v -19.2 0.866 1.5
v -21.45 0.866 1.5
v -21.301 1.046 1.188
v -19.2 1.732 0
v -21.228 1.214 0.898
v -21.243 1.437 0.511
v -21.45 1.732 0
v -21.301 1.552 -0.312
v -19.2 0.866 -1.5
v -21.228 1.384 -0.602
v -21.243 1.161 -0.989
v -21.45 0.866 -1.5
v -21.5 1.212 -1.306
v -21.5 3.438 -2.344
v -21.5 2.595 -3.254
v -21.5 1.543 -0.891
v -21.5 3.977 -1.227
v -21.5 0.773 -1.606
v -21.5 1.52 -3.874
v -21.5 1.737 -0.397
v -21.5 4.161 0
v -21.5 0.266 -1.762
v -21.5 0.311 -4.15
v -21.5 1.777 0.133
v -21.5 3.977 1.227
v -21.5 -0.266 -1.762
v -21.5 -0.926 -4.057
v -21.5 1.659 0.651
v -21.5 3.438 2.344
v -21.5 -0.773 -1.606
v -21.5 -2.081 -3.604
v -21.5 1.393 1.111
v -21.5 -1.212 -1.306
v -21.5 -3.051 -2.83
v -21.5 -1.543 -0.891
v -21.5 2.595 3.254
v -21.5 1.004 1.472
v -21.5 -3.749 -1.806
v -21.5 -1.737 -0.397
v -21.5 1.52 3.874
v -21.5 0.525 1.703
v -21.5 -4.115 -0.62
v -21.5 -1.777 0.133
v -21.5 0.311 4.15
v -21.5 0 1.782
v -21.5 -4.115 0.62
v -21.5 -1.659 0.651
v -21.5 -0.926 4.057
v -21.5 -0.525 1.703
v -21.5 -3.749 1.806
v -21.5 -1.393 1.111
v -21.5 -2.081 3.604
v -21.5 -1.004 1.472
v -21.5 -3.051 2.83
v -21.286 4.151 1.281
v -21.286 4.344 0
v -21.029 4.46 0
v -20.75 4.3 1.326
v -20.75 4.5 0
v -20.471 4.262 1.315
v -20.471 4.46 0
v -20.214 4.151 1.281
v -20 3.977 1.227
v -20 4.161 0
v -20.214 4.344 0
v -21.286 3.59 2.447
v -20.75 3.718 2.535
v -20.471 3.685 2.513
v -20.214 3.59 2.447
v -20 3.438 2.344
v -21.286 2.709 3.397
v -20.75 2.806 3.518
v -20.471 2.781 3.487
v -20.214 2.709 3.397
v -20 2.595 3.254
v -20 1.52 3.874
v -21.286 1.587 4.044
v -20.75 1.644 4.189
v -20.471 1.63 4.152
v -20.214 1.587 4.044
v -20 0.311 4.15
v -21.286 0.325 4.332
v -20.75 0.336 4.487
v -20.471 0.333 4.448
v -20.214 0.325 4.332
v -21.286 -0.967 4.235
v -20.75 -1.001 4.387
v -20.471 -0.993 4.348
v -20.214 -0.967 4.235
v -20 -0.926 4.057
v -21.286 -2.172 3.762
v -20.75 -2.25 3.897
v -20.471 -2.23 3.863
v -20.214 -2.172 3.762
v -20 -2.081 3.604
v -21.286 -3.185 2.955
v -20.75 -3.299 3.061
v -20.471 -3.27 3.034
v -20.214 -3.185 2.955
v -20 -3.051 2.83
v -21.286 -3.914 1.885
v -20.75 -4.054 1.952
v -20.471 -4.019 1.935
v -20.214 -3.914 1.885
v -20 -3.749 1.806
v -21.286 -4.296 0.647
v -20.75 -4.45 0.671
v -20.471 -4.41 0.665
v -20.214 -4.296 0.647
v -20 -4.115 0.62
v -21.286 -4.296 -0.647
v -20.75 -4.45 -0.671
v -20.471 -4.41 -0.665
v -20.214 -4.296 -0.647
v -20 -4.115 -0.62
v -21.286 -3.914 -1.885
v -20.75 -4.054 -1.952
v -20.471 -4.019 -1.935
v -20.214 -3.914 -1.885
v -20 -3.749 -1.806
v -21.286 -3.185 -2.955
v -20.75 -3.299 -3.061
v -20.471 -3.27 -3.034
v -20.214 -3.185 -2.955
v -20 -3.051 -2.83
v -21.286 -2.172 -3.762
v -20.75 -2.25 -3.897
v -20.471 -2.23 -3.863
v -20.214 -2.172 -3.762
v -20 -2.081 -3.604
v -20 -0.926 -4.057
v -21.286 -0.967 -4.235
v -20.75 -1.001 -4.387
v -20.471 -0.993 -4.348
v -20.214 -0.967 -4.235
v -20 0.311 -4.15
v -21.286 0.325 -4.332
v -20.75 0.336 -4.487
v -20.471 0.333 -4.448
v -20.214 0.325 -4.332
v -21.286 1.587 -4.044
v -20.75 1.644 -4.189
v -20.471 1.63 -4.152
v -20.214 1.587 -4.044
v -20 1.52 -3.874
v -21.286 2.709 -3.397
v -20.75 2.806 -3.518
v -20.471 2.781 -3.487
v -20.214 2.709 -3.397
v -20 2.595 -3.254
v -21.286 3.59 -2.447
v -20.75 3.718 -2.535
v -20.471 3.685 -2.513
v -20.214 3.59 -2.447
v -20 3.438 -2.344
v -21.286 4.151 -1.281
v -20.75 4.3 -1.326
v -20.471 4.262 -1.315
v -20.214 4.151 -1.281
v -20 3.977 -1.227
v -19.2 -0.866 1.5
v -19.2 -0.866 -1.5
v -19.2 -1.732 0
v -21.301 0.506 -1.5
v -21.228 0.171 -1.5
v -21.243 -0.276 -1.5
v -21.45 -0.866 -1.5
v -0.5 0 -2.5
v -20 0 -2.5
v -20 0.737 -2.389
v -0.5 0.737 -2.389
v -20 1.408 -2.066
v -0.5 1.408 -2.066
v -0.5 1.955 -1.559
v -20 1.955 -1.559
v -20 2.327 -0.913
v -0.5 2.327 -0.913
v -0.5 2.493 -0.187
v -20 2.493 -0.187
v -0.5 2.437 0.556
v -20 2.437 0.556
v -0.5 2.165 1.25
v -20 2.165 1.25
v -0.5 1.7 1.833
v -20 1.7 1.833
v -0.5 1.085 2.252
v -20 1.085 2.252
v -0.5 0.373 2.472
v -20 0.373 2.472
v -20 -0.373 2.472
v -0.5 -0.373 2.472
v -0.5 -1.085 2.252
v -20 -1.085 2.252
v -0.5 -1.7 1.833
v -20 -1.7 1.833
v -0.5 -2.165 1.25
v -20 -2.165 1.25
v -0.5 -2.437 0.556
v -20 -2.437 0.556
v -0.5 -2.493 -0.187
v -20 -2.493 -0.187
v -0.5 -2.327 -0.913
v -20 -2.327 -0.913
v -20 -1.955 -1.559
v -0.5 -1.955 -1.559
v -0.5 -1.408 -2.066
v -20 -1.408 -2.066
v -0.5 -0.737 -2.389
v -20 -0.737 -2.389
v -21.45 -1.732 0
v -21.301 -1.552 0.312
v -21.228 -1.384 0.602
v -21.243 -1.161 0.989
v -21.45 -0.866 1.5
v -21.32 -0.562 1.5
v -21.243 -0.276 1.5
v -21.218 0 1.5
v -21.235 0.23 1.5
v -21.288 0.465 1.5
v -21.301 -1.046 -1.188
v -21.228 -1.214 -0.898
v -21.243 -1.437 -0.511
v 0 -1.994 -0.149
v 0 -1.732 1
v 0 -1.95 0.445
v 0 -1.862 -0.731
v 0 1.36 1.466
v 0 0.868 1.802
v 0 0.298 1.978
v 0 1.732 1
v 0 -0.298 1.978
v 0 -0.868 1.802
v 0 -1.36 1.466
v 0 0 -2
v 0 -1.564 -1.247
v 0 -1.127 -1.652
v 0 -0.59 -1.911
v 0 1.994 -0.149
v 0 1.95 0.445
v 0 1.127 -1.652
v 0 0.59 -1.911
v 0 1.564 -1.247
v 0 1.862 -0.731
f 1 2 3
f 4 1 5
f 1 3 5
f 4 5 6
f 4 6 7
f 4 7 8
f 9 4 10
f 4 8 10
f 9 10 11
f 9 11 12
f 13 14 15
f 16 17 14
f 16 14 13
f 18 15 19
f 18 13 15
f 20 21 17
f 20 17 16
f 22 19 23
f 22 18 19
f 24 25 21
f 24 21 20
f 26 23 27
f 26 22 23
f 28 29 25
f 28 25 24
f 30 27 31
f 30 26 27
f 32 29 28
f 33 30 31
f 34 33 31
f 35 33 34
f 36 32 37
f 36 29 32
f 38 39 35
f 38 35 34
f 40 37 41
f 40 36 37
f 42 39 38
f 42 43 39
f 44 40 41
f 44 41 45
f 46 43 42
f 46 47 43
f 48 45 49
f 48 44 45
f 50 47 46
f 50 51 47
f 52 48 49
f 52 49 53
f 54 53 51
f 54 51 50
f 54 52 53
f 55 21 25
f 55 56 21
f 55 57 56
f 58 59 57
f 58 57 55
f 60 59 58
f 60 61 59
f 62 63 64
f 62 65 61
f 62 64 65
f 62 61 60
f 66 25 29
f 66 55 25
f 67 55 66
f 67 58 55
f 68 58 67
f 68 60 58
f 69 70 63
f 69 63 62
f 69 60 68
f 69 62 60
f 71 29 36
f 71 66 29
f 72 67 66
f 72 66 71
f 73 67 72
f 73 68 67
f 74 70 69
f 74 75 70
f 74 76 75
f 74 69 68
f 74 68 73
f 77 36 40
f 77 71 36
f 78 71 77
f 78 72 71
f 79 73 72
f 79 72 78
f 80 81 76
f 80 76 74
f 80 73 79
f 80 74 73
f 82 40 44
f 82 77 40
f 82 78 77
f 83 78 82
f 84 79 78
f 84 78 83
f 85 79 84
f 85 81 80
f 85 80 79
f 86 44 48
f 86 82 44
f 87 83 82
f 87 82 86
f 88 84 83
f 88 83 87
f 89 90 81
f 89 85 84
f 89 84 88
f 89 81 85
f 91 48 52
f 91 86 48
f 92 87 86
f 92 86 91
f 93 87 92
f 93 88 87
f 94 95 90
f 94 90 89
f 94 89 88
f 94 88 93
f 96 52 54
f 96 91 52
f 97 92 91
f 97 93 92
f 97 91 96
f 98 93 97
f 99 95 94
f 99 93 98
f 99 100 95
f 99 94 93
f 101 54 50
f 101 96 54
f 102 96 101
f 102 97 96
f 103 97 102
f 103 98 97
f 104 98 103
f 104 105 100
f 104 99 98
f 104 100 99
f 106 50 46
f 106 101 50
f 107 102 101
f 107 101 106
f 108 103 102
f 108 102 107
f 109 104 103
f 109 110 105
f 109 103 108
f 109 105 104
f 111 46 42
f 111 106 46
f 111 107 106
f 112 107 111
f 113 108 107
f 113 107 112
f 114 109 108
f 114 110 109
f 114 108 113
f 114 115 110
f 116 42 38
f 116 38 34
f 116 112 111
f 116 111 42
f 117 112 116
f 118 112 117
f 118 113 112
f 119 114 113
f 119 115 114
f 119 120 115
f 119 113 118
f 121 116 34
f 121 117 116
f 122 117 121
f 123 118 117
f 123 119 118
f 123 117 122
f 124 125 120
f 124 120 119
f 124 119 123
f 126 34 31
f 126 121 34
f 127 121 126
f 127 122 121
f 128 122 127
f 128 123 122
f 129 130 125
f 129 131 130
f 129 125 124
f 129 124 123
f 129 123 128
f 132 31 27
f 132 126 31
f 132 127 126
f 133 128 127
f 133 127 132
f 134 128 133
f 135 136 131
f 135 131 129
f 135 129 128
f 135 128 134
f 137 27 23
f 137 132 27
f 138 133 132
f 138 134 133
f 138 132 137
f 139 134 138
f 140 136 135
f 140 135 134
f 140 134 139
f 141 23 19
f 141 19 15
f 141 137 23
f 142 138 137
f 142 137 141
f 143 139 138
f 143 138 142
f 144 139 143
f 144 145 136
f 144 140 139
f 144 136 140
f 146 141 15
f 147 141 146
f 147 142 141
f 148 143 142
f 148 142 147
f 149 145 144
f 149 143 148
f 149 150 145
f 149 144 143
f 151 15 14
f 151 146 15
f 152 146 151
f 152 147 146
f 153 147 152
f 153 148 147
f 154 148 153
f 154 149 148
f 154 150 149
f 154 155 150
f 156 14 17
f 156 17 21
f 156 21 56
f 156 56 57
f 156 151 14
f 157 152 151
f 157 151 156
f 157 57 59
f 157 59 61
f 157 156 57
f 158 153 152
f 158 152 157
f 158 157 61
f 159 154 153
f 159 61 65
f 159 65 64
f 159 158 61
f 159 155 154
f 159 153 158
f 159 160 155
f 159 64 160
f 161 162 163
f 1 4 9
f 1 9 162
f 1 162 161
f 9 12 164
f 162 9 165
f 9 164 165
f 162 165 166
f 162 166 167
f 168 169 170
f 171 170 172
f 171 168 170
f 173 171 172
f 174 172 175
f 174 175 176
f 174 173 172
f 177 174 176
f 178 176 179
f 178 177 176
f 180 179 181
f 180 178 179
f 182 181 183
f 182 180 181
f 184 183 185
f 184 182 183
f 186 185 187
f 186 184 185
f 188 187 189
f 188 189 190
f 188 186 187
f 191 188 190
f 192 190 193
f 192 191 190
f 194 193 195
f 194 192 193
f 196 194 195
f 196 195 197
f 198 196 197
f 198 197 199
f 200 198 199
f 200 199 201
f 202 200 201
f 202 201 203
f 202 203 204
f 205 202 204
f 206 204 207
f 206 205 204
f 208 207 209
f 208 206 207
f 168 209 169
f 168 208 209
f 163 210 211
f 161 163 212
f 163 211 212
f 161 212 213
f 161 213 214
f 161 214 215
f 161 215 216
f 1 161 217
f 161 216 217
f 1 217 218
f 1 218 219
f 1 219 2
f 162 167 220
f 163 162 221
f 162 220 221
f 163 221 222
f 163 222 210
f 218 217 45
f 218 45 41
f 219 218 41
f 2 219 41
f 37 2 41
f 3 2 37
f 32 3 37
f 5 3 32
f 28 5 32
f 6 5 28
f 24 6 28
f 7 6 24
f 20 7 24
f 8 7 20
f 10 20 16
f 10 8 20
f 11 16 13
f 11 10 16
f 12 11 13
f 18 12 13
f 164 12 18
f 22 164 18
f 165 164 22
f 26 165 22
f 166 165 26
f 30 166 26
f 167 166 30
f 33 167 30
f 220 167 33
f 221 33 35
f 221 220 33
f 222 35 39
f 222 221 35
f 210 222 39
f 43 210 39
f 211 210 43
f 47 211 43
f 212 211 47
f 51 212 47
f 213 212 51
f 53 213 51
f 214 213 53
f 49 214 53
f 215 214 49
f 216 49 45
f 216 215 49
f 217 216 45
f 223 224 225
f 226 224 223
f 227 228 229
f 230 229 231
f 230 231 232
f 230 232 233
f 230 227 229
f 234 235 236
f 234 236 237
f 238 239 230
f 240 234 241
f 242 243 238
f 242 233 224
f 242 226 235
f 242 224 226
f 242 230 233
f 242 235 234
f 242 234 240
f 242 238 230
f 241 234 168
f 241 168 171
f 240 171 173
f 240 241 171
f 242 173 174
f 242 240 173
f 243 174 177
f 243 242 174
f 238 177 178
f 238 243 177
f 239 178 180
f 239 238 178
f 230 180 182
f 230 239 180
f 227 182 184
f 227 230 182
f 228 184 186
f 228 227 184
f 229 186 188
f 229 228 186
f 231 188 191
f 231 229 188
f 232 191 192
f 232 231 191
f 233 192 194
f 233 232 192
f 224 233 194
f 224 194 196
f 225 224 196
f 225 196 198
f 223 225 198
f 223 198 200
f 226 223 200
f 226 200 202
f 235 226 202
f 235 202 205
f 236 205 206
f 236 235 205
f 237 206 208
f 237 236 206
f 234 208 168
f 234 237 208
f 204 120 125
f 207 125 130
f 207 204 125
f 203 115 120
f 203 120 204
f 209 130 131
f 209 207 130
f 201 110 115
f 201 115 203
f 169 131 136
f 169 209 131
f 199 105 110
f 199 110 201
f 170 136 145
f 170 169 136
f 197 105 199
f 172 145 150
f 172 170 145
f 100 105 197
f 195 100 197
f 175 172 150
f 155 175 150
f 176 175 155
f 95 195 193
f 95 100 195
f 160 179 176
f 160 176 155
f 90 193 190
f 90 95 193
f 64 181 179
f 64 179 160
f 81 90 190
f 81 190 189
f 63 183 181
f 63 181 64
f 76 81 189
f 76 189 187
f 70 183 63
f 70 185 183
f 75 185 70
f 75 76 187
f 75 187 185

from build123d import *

# Parameters (mm, degrees)
SKETCH2_R           = 2.5
BOSS_EXTRUDE1_DEPTH = 20
CHAMFER1_SIZE       = 0.5
CUT_EXTRUDE1_DEPTH  = 2.3
SKETCH8_R           = 1.782050808
CUT_EXTRUDE2_DEPTH  = 1
CUT_EXTRUDE2_TAPER  = 45


with BuildPart() as part:
    # Sketch2 → Boss-Extrude1 (new body)
    with BuildSketch(Plane(origin=(0, 0, 0), x_dir=(0, 0, -1), z_dir=(1, 0, 0))):
        Circle(SKETCH2_R)
    extrude(amount=-BOSS_EXTRUDE1_DEPTH)

    # Chamfer1
    chamfer1_edges = [part.edges().sort_by_distance(p)[0] for p in [
        (0, 0, 2.5),
    ]]
    chamfer(chamfer1_edges, length=CHAMFER1_SIZE)

    # Sketch6 → Revolve1 (revolve)
    with BuildSketch(Plane.XY):
        with BuildLine():
            Line((-21.5, 0), (-21.5, 4.161437828))
            ThreePointArc((-21.5, 4.161437828), (-20.75, 4.5), (-20, 4.161437828))
            Line((-20, 4.161437828), (-20, 0))
            Line((-20, 0), (-21.5, 0))
        make_face()
    revolve(axis=Axis((-20, 0, 0), (1, 0, 0)))

    # Sketch7 → Cut-Extrude1 (cut)
    with BuildSketch(Plane.ZY.offset(21.5)):
        Polygon((0, 1.732050808), (-1.5, 0.866025404), (-1.5, -0.866025404), (0, -1.732050808), (1.5, -0.866025404), (1.5, 0.866025404), align=None)
    extrude(amount=-CUT_EXTRUDE1_DEPTH, mode=Mode.SUBTRACT)

    # Sketch8 → Cut-Extrude2 (cut)
    with BuildSketch(Plane.ZY.offset(21.5)):
        Circle(SKETCH8_R)
    extrude(amount=-CUT_EXTRUDE2_DEPTH, taper=CUT_EXTRUDE2_TAPER, mode=Mode.SUBTRACT)


solid = part.part
